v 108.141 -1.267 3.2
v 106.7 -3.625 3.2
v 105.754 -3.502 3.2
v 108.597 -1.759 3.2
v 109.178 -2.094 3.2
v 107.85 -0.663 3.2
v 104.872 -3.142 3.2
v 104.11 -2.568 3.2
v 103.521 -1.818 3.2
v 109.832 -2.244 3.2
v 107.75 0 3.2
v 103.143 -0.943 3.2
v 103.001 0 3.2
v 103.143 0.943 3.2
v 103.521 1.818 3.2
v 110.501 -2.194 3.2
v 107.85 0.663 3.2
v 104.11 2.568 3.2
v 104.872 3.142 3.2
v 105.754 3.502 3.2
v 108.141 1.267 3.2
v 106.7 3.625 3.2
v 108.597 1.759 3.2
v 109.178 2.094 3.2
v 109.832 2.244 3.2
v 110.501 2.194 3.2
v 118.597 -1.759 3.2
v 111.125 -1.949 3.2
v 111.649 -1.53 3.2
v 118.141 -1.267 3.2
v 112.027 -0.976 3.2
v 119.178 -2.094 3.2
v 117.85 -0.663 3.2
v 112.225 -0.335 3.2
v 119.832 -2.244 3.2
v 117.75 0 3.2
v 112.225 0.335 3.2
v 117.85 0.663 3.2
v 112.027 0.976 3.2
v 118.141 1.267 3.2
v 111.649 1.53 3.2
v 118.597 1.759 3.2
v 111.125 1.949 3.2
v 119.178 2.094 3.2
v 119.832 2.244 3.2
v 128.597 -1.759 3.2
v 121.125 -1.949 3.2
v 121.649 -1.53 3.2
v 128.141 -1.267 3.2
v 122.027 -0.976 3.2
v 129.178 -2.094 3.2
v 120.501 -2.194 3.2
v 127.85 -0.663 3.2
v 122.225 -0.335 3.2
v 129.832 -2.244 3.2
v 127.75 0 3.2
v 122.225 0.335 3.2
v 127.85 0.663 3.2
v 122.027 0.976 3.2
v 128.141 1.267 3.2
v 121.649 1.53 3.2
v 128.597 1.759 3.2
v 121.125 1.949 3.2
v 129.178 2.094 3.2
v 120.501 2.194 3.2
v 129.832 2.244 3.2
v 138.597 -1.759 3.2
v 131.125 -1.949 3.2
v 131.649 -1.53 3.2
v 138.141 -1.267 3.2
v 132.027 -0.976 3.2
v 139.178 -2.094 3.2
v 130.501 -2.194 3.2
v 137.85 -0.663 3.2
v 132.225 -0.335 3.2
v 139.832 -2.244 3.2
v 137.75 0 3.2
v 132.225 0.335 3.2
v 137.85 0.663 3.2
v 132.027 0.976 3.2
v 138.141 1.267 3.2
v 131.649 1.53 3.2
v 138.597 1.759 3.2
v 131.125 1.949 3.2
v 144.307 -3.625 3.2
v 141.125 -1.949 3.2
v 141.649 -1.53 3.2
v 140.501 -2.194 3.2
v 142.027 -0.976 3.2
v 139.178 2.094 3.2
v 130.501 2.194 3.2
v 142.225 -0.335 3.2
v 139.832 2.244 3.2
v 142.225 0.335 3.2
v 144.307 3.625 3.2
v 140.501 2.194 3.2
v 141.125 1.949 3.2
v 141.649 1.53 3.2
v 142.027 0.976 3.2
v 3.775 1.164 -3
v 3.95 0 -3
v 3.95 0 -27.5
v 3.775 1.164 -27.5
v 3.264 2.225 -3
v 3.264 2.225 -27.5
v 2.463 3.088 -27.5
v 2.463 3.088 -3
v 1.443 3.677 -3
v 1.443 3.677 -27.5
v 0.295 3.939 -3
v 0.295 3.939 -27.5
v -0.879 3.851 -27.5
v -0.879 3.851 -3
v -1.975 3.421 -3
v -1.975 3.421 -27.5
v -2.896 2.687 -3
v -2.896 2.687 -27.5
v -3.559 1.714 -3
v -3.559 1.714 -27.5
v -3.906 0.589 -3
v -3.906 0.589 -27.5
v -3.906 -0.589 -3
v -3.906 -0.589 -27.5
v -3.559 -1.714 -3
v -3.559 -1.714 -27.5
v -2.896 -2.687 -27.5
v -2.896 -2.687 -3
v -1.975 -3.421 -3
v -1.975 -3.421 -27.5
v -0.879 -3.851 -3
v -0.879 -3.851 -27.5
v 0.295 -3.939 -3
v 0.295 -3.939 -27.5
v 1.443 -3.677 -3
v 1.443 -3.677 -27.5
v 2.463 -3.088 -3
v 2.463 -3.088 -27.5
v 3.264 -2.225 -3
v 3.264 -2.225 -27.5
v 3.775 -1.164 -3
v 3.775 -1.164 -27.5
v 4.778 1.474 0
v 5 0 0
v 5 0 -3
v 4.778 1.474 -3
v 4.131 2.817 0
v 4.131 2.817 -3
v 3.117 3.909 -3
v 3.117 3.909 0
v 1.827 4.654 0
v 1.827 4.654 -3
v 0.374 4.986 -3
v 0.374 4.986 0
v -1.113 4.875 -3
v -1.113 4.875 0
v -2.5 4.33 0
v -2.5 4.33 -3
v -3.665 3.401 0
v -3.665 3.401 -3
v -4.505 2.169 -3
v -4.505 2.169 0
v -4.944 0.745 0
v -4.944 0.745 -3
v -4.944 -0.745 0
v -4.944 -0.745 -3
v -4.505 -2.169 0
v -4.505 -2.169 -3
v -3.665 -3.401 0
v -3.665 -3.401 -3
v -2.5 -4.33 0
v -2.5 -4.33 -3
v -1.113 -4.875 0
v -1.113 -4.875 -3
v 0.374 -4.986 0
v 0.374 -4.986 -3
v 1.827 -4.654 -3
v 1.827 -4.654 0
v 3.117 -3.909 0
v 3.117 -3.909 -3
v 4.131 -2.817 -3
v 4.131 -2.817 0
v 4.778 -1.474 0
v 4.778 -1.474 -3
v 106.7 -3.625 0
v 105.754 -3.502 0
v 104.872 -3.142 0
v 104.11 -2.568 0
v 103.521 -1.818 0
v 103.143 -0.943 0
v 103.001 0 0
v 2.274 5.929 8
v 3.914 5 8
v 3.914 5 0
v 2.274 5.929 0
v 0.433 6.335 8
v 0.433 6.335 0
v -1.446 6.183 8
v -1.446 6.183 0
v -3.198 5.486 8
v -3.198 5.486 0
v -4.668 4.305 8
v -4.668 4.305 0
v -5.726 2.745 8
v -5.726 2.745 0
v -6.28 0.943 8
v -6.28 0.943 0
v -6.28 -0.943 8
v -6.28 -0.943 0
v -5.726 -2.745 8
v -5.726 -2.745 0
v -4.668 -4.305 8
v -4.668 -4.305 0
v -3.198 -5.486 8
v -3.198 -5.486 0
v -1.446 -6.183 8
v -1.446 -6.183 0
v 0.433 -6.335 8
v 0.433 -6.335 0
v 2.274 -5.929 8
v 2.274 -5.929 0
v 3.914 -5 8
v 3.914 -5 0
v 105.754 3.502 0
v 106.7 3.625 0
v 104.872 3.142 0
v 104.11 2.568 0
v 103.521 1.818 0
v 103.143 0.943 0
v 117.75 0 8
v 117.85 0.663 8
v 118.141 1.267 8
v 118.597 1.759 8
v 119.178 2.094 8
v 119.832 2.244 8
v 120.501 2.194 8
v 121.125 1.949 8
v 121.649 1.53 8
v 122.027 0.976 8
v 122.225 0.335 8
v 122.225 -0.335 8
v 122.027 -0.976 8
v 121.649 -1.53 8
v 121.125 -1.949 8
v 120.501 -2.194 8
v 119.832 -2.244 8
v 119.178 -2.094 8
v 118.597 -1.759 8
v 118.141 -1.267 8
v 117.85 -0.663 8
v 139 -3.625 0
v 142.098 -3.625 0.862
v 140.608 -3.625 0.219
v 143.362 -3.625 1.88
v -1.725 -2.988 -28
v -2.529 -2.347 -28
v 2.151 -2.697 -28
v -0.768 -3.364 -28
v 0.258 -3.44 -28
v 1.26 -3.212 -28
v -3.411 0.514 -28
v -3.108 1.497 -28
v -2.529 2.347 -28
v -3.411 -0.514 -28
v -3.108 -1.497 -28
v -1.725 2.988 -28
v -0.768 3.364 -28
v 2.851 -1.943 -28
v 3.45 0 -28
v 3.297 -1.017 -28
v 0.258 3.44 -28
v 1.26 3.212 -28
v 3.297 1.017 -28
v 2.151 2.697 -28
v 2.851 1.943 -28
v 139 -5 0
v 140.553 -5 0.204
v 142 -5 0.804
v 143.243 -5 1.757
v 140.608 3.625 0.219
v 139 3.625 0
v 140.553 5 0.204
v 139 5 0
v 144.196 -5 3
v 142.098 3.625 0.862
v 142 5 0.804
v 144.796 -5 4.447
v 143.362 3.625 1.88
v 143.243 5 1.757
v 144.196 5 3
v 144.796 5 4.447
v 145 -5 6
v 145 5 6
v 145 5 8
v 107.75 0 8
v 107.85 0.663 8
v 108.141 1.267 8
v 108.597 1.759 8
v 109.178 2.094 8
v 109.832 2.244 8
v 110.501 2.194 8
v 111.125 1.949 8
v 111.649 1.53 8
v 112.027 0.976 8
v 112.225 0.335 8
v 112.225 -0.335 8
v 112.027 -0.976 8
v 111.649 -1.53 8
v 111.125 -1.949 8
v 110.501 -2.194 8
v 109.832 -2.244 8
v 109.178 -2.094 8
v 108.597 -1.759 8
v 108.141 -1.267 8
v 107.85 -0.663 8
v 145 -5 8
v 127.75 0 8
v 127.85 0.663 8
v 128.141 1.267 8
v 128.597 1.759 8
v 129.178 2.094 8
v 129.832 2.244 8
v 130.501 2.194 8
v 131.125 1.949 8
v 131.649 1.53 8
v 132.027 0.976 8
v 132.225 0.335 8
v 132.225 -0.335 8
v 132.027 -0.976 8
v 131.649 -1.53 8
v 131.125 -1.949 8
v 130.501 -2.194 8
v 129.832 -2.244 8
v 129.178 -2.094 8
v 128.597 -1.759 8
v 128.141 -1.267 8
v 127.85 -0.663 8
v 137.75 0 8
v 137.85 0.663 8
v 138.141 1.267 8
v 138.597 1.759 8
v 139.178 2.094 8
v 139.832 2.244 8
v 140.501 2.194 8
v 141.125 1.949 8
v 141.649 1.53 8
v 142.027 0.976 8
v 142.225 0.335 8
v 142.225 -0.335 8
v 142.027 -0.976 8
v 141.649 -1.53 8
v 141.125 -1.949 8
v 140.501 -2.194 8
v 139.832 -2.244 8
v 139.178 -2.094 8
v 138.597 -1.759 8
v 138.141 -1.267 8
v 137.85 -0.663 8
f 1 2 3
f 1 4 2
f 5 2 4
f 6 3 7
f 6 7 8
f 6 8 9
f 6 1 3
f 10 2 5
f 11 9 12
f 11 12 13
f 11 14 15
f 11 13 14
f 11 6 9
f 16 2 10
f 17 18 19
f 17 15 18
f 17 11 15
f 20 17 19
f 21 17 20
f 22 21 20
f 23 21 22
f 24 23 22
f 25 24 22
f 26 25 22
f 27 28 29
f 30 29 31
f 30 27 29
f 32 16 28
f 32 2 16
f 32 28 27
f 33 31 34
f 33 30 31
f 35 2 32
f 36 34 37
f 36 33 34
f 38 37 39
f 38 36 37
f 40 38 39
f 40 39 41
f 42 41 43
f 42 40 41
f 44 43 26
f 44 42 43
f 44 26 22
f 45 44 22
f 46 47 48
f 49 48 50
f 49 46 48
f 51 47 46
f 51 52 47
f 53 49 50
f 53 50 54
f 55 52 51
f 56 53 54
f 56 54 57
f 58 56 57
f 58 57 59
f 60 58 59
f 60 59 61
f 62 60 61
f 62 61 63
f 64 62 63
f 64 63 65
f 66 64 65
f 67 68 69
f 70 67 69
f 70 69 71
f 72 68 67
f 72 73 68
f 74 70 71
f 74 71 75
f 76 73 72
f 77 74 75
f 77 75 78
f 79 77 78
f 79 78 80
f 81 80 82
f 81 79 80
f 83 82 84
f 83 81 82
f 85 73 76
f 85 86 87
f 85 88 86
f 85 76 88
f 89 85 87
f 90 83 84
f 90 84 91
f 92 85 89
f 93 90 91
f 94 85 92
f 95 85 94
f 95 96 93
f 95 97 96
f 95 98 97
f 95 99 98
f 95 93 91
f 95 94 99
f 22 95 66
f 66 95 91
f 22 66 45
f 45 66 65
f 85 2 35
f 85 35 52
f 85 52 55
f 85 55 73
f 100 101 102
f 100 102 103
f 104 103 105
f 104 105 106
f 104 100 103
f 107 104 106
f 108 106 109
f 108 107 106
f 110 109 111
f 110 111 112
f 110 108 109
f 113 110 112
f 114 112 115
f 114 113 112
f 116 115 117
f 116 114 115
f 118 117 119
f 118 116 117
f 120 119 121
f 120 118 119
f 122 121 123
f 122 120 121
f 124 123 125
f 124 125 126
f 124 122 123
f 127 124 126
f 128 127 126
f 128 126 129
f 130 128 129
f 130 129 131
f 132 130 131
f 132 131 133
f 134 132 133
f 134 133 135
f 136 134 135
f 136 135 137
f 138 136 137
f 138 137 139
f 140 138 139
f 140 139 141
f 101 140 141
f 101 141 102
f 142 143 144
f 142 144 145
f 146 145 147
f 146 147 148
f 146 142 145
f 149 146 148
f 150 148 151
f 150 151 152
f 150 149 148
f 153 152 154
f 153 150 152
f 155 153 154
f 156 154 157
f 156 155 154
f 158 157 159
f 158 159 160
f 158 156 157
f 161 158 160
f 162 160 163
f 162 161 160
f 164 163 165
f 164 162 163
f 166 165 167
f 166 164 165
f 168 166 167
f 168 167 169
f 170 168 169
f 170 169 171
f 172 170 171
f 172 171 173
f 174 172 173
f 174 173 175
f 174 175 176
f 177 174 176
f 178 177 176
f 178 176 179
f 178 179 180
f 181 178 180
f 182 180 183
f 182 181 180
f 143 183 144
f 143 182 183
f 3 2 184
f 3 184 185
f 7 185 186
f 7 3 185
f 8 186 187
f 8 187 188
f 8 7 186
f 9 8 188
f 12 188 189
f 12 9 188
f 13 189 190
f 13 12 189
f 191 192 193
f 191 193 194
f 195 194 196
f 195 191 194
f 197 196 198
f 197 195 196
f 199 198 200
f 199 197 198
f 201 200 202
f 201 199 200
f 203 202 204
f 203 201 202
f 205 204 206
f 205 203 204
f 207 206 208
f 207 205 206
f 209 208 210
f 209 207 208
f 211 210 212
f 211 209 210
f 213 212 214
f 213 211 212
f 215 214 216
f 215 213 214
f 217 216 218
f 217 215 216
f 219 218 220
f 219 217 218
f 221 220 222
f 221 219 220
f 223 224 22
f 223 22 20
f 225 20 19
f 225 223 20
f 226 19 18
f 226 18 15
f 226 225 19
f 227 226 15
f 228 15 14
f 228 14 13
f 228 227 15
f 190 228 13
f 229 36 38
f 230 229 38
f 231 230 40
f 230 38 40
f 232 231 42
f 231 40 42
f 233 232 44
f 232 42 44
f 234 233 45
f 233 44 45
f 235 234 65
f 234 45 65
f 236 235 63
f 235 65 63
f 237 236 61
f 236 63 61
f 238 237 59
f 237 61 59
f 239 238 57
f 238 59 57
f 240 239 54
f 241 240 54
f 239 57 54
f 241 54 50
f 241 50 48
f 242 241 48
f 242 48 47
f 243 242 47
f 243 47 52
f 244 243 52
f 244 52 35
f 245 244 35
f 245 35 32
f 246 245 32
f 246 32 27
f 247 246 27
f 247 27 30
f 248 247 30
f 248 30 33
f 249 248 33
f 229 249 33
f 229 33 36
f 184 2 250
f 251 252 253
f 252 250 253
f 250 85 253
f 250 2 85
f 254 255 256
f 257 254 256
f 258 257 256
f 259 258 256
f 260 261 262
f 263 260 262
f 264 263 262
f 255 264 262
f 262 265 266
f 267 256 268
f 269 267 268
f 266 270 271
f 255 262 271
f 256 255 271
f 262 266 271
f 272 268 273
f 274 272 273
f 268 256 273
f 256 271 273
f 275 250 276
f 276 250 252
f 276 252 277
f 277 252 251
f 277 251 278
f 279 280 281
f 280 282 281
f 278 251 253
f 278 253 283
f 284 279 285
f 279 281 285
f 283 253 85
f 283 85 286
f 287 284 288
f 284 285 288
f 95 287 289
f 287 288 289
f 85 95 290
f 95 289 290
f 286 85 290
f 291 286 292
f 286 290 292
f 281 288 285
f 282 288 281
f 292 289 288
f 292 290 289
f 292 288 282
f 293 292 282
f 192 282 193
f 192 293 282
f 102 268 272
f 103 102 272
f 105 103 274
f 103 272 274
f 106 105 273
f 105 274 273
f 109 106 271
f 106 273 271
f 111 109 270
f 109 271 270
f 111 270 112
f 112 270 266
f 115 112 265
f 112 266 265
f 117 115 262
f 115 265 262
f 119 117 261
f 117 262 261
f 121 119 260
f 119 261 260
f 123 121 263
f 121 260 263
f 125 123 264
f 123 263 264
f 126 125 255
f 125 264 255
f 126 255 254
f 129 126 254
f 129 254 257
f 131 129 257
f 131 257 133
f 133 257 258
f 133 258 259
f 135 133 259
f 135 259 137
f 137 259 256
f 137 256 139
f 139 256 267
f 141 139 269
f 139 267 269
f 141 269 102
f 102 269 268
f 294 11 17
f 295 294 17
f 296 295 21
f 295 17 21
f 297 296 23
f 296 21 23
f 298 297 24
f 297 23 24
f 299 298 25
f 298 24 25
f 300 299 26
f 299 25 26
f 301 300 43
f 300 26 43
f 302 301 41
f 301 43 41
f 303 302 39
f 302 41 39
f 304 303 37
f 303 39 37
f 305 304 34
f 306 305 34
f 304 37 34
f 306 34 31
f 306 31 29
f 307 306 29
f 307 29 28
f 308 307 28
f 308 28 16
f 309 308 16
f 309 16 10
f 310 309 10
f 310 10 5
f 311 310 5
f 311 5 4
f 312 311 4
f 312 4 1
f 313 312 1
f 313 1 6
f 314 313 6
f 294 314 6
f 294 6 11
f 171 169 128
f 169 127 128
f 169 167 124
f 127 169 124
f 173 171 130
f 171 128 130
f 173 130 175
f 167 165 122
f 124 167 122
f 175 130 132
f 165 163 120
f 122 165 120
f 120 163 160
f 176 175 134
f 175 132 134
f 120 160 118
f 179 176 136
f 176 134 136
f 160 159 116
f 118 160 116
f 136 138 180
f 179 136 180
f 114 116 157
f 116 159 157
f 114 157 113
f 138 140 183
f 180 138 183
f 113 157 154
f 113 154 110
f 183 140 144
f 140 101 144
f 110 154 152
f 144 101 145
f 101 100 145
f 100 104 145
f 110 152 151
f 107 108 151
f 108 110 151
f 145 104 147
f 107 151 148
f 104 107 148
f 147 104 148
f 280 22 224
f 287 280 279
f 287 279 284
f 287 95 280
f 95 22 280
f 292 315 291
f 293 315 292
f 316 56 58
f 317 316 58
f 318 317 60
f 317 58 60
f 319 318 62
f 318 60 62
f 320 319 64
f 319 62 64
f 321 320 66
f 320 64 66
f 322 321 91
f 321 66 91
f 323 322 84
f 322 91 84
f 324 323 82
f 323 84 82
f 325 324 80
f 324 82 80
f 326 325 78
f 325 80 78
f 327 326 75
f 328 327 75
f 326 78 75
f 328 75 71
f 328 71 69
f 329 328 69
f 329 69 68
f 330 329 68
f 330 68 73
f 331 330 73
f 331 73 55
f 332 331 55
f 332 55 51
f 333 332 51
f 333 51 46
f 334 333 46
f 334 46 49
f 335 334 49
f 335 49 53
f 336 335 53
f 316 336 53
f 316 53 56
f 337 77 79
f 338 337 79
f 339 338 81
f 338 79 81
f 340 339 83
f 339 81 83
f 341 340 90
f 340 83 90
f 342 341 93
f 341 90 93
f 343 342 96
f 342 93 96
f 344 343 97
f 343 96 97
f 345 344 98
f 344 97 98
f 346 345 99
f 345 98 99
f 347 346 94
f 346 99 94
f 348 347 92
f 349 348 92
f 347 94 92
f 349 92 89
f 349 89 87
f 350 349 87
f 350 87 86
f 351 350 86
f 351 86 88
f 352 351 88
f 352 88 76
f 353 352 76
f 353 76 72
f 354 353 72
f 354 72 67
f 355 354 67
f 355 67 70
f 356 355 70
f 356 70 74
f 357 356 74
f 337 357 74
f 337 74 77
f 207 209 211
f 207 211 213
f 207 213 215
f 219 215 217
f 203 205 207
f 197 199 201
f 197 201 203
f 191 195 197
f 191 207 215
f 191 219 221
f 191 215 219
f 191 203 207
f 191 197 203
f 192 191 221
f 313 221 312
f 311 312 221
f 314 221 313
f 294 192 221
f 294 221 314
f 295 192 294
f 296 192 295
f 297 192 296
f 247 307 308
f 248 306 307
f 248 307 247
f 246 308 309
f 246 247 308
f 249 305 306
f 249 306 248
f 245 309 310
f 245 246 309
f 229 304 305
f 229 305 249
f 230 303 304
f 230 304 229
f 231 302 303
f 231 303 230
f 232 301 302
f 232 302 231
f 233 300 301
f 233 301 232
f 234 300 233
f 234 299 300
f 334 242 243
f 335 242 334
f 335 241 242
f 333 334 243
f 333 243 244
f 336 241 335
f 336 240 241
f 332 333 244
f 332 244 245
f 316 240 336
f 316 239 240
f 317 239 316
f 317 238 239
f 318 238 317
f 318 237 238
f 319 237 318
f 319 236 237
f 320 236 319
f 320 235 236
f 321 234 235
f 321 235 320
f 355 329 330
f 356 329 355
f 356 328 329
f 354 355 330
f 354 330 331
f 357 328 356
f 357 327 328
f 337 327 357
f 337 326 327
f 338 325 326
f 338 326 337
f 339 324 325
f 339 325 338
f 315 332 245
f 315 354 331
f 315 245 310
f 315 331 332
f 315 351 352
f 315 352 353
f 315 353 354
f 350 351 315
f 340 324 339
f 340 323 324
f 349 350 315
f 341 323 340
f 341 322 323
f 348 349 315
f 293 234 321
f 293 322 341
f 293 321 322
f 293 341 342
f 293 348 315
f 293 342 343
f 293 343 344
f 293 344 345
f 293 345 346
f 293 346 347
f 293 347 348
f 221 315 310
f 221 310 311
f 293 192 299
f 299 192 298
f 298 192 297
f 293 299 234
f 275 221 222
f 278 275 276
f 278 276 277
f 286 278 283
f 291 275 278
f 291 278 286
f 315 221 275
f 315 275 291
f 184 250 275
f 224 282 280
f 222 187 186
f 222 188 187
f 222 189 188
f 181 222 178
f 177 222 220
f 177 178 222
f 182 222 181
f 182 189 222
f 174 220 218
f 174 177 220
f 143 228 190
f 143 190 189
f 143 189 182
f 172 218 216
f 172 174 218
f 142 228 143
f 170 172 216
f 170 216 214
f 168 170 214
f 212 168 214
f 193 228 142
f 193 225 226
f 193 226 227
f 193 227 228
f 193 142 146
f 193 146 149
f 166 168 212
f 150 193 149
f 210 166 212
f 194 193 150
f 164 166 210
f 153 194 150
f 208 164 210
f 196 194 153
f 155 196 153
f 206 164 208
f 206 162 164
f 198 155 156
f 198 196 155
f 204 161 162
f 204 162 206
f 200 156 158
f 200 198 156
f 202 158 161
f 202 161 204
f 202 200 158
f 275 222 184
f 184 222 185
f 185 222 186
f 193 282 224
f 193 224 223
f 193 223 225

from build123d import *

# Parameters (mm, degrees)
SKETCH1_R            = 3.95
BOSS_EXTRUDE1_DEPTH  = 28
BOSS_EXTRUDE2_START  = 8
BOSS_EXTRUDE2_DEPTH  = 8
SKETCH3_R            = 5
BOSS_EXTRUDE3_DEPTH  = 3
SKETCH5_W            = 3.2
SKETCH5_H            = 7.25
CUT_EXTRUDE1_DEPTH   = 42
M4_CLEARANCE_HOLE1_D = 4.5
CHAMFER1_SIZE        = 0.5
FILLET1_R            = 3.7
FILLET5_R            = 6


with BuildPart() as part:
    # Sketch1 → Boss-Extrude1 (new body)
    with BuildSketch(Plane.XY):
        Circle(SKETCH1_R)
    extrude(amount=-BOSS_EXTRUDE1_DEPTH)

    # Sketch2 → Boss-Extrude2 (add)
    with BuildSketch(Plane.XY.offset(BOSS_EXTRUDE2_START)):
        with BuildLine():
            ThreePointArc((6.35, 0), (5.708717799, 2.780834604), (3.914396505, 5))
            Line((3.914396505, 5), (0, 5))
            Line((0, 5), (0, 3.95))
            ThreePointArc((0, 3.95), (2.793071786, 2.793071786), (3.95, 0))
            ThreePointArc((3.95, 0), (2.793071786, -2.793071786), (0, -3.95))
            Line((0, -3.95), (0, -5))
            Line((0, -5), (3.914396505, -5))
            ThreePointArc((3.914396505, -5), (5.708717799, -2.780834604), (6.35, 0))
        make_face()
        with BuildLine():
            Line((0, 5), (3.914396505, 5))
            ThreePointArc((3.914396505, 5), (-6.35, 0), (3.914396505, -5))
            Line((3.914396505, -5), (0, -5))
            Line((0, -5), (0, -3.95))
            ThreePointArc((0, -3.95), (-3.95, 0), (0, 3.95))
            Line((0, 3.95), (0, 5))
        make_face()
        with BuildLine():
            Line((145, -5), (145, 5))
            Line((145, 5), (3.914396505, 5))
            ThreePointArc((3.914396505, 5), (5.708717799, 2.780834604), (6.35, 0))
            ThreePointArc((6.35, 0), (5.708717799, -2.780834604), (3.914396505, -5))
            Line((3.914396505, -5), (145, -5))
        make_face()
        with BuildLine():
            ThreePointArc((3.95, 0), (2.793071786, 2.793071786), (0, 3.95))
            Line((0, 3.95), (0, -3.95))
            ThreePointArc((0, -3.95), (2.793071786, -2.793071786), (3.95, 0))
        make_face()
        with BuildLine():
            Line((0, -3.95), (0, 3.95))
            ThreePointArc((0, 3.95), (-3.95, 0), (0, -3.95))
        make_face()
    extrude(amount=-BOSS_EXTRUDE2_DEPTH)

    # Sketch3 → Boss-Extrude3 (add)
    with BuildSketch(Plane.XY):
        Circle(SKETCH3_R)
    extrude(amount=-BOSS_EXTRUDE3_DEPTH)

    # Sketch5 → Cut-Extrude1 (cut)
    with BuildSketch(Plane(origin=(145, 0, 0), x_dir=(0, 0, -1), z_dir=(1, 0, 0))):
        with Locations((-1.6, 0)):
            Rectangle(SKETCH5_W, SKETCH5_H)
    extrude(amount=-CUT_EXTRUDE1_DEPTH, mode=Mode.SUBTRACT)

    # M4 Clearance Hole1 (through all)
    with Locations(Plane.XY.offset(8)):
        with Locations((140, 0), (130, 0), (120, 0), (110, 0)):
            Hole(M4_CLEARANCE_HOLE1_D / 2)

    # Chamfer1
    chamfer1_edges = [part.edges().sort_by_distance(p)[0] for p in [
        (-3.95, 0, -28),
    ]]
    chamfer(chamfer1_edges, length=CHAMFER1_SIZE)

    # Fillet1
    # the kernel refuses this fillet: 3.7 mm, written as the material it adds along each edge
    with BuildSketch(Plane(origin=(103, -3.625, 3.2), x_dir=(0, 1, 0), z_dir=(0, 0, -1))) as fillet1_piece_1:
        with BuildLine():
            CenterArc((FILLET1_R, FILLET1_R), FILLET1_R, 180, 90)
            Line((0, FILLET1_R), (0, 0))
            Line((0, 0), (FILLET1_R, 0))
        make_face()
    extrude(amount=3.2)
    with BuildSketch(Plane(origin=(103, 3.625, 0), x_dir=(1, 0, 0), z_dir=(0, 0, 1))) as fillet1_piece_2:
        with BuildLine():
            CenterArc((FILLET1_R, -FILLET1_R), FILLET1_R, 90, 90)
            Line((0, -FILLET1_R), (0, 0))
            Line((0, 0), (FILLET1_R, 0))
        make_face()
    extrude(amount=3.2)

    # Fillet5
    fillet5_edges = [part.edges().sort_by_distance(p)[0] for p in [
        (145, 4.3125, 0),
    ]]
    fillet(fillet5_edges, radius=FILLET5_R)


solid = part.part
